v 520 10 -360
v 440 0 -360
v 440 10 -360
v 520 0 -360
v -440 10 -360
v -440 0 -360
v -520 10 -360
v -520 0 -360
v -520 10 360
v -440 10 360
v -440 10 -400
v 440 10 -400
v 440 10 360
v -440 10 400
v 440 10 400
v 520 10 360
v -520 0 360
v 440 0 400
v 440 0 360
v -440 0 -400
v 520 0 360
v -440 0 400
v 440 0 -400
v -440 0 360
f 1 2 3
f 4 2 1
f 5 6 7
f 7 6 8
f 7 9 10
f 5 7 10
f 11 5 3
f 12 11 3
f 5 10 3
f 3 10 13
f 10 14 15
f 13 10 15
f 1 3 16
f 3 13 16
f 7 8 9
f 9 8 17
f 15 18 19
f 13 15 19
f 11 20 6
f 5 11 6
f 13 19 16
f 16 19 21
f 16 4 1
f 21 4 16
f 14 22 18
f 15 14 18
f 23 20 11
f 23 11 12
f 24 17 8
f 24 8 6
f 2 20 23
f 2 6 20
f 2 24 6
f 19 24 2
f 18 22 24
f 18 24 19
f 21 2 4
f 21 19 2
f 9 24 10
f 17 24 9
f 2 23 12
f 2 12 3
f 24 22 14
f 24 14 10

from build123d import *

# Parameters (mm, degrees)
BOSS_EXTRUDE1_DEPTH  = 10
MIRROR2_COPY_1_DEPTH = 10


with BuildPart() as part:
    # Sketch1 → Boss-Extrude1 (new body)
    with BuildSketch(Plane(origin=(0, 0, 0), x_dir=(1, 0, 0), z_dir=(0, 1, 0))):
        Polygon((0, 0), (0, -400), (-440, -400), (-440, -360), (-520, -360), (-520, 0), align=None)
    boss_extrude1 = extrude(amount=BOSS_EXTRUDE1_DEPTH)

    # Mirror1: Boss-Extrude1 across plane
    add(boss_extrude1.mirror(Plane.XY))

    # Mirror2: Boss-Extrude1 across plane
    add(boss_extrude1.mirror(Plane(origin=(0, 0, 0), x_dir=(0, 0, 1), z_dir=(1, 0, 0))))

    # Mirror2 copy 1 sketch → Mirror2 copy 1 (add)
    with BuildSketch(Plane(origin=(0, 0, 0), x_dir=(-1, 0, 0), z_dir=(0, 1, 0))):
        Polygon((0, 0), (0, -400), (-440, -400), (-440, -360), (-520, -360), (-520, 0), align=None)
    extrude(amount=MIRROR2_COPY_1_DEPTH)


solid = part.part
